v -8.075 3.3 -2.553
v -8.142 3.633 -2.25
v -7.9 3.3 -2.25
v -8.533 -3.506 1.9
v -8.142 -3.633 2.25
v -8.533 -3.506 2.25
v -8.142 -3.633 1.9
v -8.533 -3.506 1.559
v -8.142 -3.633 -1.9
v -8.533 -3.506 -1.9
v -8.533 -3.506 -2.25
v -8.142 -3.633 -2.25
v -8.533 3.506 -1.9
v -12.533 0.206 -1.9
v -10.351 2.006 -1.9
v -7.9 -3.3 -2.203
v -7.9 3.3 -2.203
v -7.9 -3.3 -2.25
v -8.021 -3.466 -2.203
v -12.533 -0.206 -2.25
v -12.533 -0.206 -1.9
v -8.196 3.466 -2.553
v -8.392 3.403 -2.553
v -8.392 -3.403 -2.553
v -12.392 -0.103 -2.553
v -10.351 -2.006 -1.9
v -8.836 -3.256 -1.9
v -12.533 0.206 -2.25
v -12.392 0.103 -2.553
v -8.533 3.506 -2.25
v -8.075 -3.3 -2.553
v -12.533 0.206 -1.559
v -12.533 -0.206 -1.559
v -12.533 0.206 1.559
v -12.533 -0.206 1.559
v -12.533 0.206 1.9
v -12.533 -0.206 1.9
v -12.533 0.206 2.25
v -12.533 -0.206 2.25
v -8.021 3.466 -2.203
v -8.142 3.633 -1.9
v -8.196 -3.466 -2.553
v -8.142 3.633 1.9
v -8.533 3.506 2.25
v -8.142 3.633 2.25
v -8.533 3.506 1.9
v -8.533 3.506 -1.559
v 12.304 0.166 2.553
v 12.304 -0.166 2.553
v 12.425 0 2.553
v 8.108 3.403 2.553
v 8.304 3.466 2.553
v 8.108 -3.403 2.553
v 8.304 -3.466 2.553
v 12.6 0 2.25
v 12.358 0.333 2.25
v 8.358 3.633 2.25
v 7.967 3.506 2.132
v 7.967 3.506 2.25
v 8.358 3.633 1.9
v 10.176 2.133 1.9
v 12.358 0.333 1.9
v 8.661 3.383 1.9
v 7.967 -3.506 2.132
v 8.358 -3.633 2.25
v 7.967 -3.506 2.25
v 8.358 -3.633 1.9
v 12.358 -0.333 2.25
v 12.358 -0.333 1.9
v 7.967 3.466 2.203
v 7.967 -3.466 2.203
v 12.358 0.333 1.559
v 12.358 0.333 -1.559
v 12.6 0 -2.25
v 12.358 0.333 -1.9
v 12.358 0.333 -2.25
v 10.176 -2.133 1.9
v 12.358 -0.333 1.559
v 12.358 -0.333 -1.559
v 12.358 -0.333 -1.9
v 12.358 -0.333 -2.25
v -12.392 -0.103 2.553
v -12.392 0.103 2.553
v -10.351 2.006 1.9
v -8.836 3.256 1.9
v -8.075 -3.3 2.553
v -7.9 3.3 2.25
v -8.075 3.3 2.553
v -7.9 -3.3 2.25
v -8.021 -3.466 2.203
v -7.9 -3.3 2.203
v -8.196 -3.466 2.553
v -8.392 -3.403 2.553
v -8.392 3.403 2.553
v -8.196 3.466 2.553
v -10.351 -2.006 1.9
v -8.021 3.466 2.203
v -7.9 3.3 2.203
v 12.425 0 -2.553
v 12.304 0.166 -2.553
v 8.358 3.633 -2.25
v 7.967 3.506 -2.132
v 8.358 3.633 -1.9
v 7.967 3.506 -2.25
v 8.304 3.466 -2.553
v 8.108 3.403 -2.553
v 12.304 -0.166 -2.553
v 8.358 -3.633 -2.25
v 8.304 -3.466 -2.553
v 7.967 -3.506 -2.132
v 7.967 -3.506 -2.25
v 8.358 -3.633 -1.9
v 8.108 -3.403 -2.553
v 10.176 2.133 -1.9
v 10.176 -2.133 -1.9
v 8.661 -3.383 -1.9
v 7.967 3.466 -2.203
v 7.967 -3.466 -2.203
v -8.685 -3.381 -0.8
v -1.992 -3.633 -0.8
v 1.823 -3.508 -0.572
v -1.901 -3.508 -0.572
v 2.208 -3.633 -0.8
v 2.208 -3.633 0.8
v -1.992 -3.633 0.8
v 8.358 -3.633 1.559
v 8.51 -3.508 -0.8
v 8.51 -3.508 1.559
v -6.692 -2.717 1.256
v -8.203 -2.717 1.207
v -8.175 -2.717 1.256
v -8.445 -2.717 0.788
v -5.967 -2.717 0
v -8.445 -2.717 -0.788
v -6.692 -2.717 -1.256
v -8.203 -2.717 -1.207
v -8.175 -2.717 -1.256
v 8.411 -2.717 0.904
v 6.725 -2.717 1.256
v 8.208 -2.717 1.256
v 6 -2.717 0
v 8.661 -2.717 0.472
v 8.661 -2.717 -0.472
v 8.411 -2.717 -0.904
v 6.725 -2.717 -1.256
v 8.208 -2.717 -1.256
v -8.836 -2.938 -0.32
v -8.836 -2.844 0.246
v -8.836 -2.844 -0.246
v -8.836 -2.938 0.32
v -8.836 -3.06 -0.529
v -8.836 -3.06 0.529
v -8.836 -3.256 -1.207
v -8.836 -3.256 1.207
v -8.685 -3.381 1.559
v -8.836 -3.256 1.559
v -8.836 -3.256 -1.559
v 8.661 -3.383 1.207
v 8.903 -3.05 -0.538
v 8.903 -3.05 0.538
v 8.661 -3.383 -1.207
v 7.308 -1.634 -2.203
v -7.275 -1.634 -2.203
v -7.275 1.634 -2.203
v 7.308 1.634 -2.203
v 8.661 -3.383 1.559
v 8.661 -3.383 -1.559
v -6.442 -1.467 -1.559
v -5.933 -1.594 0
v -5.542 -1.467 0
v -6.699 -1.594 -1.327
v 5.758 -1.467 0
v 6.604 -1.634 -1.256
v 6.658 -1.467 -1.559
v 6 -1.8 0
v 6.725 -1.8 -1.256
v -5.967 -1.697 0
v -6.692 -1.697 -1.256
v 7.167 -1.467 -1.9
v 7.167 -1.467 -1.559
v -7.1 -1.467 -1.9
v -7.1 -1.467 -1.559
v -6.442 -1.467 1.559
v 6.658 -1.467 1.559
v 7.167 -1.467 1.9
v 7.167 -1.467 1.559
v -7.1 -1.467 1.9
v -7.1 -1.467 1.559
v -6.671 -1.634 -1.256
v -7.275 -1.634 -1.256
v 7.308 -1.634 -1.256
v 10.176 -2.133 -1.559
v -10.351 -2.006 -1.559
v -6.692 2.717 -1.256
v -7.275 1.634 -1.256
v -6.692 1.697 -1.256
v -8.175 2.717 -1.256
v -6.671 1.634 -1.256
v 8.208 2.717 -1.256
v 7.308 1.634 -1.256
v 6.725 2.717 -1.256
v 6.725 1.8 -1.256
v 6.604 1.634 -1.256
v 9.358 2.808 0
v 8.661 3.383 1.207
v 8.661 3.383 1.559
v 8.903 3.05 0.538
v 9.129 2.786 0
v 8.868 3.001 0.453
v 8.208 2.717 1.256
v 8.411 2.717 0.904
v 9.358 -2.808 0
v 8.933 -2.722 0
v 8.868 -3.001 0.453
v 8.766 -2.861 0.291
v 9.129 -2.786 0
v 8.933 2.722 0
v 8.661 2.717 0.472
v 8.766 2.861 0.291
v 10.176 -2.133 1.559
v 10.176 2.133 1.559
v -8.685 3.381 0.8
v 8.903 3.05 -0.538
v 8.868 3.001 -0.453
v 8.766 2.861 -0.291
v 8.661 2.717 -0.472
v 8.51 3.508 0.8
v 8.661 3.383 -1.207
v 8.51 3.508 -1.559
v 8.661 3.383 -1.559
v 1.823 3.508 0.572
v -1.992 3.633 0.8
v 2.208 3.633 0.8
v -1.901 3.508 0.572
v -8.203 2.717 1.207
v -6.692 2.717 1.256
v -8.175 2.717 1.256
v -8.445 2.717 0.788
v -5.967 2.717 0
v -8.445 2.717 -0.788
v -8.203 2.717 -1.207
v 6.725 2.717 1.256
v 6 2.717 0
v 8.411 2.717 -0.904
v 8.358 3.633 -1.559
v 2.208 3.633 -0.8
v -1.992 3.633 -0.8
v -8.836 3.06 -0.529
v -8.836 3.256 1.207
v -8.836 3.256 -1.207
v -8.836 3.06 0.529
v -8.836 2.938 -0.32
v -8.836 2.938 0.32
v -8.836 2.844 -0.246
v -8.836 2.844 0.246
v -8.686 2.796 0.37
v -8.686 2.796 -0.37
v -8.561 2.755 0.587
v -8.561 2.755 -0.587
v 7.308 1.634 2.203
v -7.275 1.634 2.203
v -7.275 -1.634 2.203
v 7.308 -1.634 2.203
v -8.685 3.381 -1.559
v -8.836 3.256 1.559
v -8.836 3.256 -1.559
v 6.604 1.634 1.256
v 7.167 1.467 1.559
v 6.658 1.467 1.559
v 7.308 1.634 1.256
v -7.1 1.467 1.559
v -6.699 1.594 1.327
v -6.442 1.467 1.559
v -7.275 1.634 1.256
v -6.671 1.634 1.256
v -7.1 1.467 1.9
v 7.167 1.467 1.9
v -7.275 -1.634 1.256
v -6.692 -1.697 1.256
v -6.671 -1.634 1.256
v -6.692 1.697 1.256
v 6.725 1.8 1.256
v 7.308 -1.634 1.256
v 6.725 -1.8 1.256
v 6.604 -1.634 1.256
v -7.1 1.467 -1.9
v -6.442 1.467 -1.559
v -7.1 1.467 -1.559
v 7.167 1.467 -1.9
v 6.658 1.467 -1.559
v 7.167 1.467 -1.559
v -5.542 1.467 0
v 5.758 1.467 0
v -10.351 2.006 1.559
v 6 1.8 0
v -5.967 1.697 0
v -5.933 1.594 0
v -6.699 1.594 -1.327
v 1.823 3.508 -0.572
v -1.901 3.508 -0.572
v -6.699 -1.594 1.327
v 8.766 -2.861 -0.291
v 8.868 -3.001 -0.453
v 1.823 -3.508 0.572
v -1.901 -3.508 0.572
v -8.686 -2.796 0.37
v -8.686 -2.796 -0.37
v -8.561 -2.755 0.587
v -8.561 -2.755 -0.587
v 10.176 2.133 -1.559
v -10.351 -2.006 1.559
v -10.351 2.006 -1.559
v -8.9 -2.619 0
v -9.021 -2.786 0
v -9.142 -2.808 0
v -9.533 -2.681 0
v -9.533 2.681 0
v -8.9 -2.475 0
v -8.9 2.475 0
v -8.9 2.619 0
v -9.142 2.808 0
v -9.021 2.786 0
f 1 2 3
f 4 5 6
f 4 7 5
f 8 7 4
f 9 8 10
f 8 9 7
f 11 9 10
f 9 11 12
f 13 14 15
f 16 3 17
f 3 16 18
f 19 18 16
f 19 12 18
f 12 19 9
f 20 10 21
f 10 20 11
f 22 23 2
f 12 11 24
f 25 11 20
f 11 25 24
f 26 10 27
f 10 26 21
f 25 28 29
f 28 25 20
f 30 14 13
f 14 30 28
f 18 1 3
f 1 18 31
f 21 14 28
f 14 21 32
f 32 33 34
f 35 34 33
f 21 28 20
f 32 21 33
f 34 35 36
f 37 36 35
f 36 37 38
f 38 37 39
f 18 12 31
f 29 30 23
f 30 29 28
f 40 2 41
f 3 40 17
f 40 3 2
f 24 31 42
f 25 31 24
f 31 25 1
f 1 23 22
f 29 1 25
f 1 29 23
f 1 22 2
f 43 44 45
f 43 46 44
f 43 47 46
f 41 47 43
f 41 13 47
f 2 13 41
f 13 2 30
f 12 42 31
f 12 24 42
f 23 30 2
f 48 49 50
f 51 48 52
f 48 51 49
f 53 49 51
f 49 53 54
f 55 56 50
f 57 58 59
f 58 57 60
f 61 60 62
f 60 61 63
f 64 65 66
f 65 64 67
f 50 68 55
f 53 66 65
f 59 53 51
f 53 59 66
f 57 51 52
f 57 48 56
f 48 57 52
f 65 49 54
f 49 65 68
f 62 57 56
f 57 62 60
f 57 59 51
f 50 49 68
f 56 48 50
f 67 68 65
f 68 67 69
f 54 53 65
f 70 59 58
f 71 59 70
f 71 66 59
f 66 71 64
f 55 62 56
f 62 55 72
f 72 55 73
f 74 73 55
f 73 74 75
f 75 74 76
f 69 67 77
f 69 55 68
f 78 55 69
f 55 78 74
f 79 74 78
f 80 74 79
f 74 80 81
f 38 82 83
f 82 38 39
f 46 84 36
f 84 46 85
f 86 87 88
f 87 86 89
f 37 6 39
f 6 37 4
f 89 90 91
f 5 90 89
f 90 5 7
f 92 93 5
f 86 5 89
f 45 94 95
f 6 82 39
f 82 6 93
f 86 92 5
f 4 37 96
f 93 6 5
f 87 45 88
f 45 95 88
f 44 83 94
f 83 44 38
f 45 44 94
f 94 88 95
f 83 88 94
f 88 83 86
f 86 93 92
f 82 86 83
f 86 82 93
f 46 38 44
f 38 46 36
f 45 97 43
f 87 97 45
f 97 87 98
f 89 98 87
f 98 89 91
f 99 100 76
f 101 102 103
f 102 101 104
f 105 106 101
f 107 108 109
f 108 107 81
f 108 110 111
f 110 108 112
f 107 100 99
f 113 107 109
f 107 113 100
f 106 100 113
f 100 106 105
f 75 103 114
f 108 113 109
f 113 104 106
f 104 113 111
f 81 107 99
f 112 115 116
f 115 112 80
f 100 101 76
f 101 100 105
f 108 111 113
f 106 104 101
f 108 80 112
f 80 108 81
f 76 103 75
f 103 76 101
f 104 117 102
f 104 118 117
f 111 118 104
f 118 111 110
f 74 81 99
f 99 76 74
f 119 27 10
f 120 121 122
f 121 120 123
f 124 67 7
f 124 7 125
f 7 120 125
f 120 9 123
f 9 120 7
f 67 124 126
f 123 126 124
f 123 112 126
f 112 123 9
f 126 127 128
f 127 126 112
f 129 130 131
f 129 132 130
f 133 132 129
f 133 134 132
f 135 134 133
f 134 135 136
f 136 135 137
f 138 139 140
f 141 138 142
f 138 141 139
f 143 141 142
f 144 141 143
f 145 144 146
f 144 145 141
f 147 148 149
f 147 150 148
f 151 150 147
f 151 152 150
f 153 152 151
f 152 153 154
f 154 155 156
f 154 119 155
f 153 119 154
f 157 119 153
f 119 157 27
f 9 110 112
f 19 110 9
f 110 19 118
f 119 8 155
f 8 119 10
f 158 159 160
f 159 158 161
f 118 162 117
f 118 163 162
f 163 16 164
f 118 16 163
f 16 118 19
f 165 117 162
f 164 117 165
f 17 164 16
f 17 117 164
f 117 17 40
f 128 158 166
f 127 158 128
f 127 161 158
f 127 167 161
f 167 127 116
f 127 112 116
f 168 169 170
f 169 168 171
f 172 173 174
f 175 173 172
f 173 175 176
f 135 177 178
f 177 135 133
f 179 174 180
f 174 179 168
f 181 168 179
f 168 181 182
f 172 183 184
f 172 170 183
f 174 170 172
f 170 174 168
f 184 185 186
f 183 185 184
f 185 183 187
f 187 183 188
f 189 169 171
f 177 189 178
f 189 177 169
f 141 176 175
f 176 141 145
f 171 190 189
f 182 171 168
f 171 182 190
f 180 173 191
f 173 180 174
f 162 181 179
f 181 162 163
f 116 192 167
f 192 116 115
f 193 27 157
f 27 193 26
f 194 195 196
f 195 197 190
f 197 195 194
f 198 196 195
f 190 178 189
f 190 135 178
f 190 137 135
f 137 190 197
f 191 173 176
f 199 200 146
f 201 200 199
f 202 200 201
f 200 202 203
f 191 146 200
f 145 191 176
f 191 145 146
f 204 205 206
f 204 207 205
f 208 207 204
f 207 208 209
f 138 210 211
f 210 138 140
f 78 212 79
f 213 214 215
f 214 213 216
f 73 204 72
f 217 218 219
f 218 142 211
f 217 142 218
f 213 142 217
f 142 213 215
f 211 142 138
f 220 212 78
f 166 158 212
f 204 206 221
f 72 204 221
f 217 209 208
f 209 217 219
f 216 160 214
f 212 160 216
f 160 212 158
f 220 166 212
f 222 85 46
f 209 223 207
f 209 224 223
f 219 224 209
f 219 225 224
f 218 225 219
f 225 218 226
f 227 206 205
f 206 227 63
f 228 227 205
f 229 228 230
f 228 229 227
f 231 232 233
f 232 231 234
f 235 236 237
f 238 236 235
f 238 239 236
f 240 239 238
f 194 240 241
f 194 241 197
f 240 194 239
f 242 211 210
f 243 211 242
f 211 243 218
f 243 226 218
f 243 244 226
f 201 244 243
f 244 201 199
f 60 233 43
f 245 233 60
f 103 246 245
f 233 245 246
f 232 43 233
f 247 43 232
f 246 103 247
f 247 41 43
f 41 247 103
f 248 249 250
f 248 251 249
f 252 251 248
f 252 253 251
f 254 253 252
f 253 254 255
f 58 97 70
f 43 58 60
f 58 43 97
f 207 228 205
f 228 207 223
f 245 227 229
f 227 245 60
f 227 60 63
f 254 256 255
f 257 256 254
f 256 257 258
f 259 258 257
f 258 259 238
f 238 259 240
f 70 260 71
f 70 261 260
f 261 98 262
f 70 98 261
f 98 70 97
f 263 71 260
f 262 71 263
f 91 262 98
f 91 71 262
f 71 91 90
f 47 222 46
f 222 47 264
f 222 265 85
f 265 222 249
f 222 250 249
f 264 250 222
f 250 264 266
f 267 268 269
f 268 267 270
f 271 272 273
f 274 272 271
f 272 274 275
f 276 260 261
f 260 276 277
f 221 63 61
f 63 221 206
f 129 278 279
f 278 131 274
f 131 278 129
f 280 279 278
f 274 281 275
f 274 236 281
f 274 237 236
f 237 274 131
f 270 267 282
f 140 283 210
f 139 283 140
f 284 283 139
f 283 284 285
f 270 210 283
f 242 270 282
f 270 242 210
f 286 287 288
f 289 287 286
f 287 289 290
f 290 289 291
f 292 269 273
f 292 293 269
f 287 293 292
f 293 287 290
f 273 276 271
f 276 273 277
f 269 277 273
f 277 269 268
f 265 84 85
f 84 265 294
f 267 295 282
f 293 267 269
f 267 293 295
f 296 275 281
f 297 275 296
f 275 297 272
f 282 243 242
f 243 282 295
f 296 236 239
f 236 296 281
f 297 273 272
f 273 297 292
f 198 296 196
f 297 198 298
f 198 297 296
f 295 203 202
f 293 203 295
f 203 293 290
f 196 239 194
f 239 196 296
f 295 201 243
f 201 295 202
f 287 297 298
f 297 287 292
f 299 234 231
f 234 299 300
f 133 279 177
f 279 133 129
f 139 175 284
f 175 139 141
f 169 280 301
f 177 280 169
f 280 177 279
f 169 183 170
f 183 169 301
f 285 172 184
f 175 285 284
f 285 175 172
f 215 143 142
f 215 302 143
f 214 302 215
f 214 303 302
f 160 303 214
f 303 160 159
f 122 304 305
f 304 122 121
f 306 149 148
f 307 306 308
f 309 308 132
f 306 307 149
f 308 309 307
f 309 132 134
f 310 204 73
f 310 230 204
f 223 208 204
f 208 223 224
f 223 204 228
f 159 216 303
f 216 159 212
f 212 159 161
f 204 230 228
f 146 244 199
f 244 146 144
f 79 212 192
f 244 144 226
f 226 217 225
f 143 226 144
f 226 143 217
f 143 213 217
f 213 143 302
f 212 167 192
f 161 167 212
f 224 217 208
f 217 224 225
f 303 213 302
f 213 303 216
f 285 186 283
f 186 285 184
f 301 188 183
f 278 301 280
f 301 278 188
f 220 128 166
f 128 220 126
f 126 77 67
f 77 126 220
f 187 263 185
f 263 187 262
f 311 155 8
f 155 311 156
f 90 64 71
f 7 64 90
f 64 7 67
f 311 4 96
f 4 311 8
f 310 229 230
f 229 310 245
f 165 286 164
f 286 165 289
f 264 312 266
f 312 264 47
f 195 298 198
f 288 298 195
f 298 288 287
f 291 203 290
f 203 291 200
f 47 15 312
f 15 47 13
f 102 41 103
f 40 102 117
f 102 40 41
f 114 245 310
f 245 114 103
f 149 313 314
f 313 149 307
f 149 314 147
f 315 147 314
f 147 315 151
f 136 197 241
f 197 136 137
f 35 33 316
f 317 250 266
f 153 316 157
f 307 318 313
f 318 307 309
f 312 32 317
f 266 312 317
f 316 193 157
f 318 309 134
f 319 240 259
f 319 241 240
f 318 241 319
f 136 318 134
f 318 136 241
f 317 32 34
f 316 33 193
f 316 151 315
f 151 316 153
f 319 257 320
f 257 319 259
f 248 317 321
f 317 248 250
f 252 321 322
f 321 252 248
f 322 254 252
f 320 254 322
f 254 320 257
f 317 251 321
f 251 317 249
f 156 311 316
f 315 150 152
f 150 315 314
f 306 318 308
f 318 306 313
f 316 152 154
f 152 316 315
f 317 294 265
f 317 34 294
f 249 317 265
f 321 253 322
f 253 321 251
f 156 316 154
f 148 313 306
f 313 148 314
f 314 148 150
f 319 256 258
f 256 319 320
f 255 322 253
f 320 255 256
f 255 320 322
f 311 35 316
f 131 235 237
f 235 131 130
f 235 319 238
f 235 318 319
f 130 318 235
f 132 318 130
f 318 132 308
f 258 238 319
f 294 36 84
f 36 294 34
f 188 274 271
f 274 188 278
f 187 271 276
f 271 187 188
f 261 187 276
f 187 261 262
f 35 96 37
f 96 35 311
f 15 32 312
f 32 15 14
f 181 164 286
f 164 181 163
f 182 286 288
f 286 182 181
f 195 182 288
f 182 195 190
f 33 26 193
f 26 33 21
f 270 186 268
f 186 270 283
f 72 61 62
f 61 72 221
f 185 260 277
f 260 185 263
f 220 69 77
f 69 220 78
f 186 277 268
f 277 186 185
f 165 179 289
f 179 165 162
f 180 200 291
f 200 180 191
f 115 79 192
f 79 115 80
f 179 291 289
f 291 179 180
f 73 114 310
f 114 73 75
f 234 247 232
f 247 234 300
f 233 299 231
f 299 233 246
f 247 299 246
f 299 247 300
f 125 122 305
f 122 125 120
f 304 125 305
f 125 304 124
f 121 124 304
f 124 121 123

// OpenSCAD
// Parameters
L = 24.5; //[12.25:49:0.1]
W = 7.75; //[3.875:15.5:0.05]
H = 4.5; //[2.25:9:0.05]
slot_L = 18.5; //[9.25:22.5:0.1]
slot_W = 3.6; //[1.8:6.5:0.05]
slot_end_r = 1.8; //[0.9:3.25:0.05]
tip_L = 4.0; //[2.0:8.0:0.1]
mid_W = 7.75; //[3.875:15.5:0.05]
end_W = 2.6; //[1.3:5.2:0.05]
notch_L = 4.2; //[2.1:8.4:0.1]
notch_D = 0.7; //[0.35:1.4:0.05]
notch_H = 1.6; //[0.8:3.2:0.05]
facet_flat_W = 6.6; //[3.3:7.75:0.05]
overlap = 0.8; //[0.5:2.0:0.1]
bevel_drop = 0.9; //[0.4:1.6:0.05]
edge_chamfer = 0.35; //[0.15:0.8:0.05]
fillet_r = 0.35; //[0.15:0.9:0.05]

// Base Shapes
module outer_body() {
  linear_extrude(height=H, center=true)
    polygon(points=[
      [-L/2, 0],
      [-L/2 + tip_L, mid_W/2],
      [L/2 - tip_L, mid_W/2],
      [L/2, 0],
      [L/2 - tip_L, -mid_W/2],
      [-L/2 + tip_L, -mid_W/2]
    ]);
}

module faceted_outer_profile() {
  linear_extrude(height=H, center=true)
    polygon(points=[
      [-L/2, 0],
      [-L/2 + tip_L, facet_flat_W/2],
      [L/2 - tip_L, facet_flat_W/2],
      [L/2, 0],
      [L/2 - tip_L, -facet_flat_W/2],
      [-L/2 + tip_L, -facet_flat_W/2]
    ]);
}

module facet_top_wedge() {
  linear_extrude(height=H, center=true)
    polygon(points=[
      [-L/2 - overlap, -W/2 - overlap],
      [L/2 + overlap, -W/2 - overlap],
      [L/2 + overlap, W/2 + overlap],
      [-L/2 - overlap, W/2 + overlap]
    ]);
}

module facet_bottom_wedge() {
  linear_extrude(height=H, center=true)
    polygon(points=[
      [-L/2 - overlap, -W/2 - overlap],
      [L/2 + overlap, -W/2 - overlap],
      [L/2 + overlap, W/2 + overlap],
      [-L/2 - overlap, W/2 + overlap]
    ]);
}

module end_tapered_tips() {
  linear_extrude(height=H, center=true)
    polygon(points=[
      [-L/2, 0],
      [-L/2 + tip_L, mid_W/2],
      [-L/2 + tip_L, -mid_W/2]
    ]);
}

module end_tapered_tips_mirror() {
  linear_extrude(height=H, center=true)
    polygon(points=[
      [L/2, 0],
      [L/2 - tip_L, mid_W/2],
      [L/2 - tip_L, -mid_W/2]
    ]);
}

module central_through_slot_rect() {
  cube([slot_L - 2*slot_end_r, slot_W, H + 2*overlap], center=true);
}

module central_through_slot_end() {
  rotate([90, 0, 0])
    cylinder(r=slot_end_r, h=H + 2*overlap, center=true);
}

module side_relief_notch() {
  cube([notch_L, notch_D + overlap, notch_H], center=true);
}

module edge_chamfer_long() {
  cube([L + 2*overlap, edge_chamfer, H + 2*overlap], center=true);
}

module surface_bevel_accent() {
  cube([L - 2*tip_L, W + 2*overlap, edge_chamfer + overlap], center=true);
}

module small_fillet_rounding_sphere() {
  sphere(r=fillet_r, center=true);
}

// Operations
module facet_top_wedge_rot() {
  rotate([-45, 0, 0]) facet_top_wedge();
}

module facet_top_wedge_pos() {
  translate([0, 0, H/2 - bevel_drop/2]) facet_top_wedge_rot();
}

module facet_bottom_wedge_rot() {
  rotate([45, 0, 0]) facet_bottom_wedge();
}

module facet_bottom_wedge_pos() {
  translate([0, 0, -H/2 + bevel_drop/2]) facet_bottom_wedge_rot();
}

module faceted_cutters_union() {
  union() {
    facet_top_wedge_pos();
    facet_bottom_wedge_pos();
  }
}

module outer_body_faceted() {
  intersection() {
    outer_body();
    faceted_outer_profile();
  }
}

module outer_body_with_facets() {
  intersection() {
    outer_body_faceted();
    outer_body();
  }
}

module slot_end1_pos() {
  translate([-(slot_L/2 - slot_end_r), 0, 0]) central_through_slot_end();
}

module slot_end2_pos() {
  translate([(slot_L/2 - slot_end_r), 0, 0]) central_through_slot_end();
}

module central_through_slot() {
  union() {
    central_through_slot_rect();
    slot_end1_pos();
    slot_end2_pos();
  }
}

module notch_right_pos() {
  translate([0, W/2 - (notch_D/2) + overlap/2, 0]) side_relief_notch();
}

module notch_left_pos() {
  translate([0, -W/2 + (notch_D/2) - overlap/2, 0]) side_relief_notch();
}

module side_relief_notches() {
  union() {
    notch_right_pos();
    notch_left_pos();
  }
}

module edge_chamfer_pos_y() {
  translate([0, W/2 - edge_chamfer/2 + overlap/2, 0]) edge_chamfer_long();
}

module edge_chamfer_neg_y() {
  translate([0, -W/2 + edge_chamfer/2 - overlap/2, 0]) edge_chamfer_long();
}

module edge_chamfers() {
  union() {
    edge_chamfer_pos_y();
    edge_chamfer_neg_y();
  }
}

module surface_bevel_top_pos() {
  translate([0, 0, H/2 - (edge_chamfer/2) + overlap/2]) surface_bevel_accent();
}

module surface_bevel_bottom_pos() {
  translate([0, 0, -H/2 + (edge_chamfer/2) - overlap/2]) surface_bevel_accent();
}

module surface_bevel_accents() {
  union() {
    surface_bevel_top_pos();
    surface_bevel_bottom_pos();
  }
}

module outer_minus_slot() {
  difference() {
    outer_body_with_facets();
    central_through_slot();
  }
}

module outer_minus_slot_minus_notches() {
  difference() {
    outer_minus_slot();
    side_relief_notches();
  }
}

module outer_minus_edge_chamfers() {
  difference() {
    outer_minus_slot_minus_notches();
    edge_chamfers();
  }
}

module outer_minus_bevel_accents() {
  difference() {
    outer_minus_edge_chamfers();
    surface_bevel_accents();
  }
}

// Final Output
minkowski() {
  outer_minus_bevel_accents();
  small_fillet_rounding_sphere();
}
